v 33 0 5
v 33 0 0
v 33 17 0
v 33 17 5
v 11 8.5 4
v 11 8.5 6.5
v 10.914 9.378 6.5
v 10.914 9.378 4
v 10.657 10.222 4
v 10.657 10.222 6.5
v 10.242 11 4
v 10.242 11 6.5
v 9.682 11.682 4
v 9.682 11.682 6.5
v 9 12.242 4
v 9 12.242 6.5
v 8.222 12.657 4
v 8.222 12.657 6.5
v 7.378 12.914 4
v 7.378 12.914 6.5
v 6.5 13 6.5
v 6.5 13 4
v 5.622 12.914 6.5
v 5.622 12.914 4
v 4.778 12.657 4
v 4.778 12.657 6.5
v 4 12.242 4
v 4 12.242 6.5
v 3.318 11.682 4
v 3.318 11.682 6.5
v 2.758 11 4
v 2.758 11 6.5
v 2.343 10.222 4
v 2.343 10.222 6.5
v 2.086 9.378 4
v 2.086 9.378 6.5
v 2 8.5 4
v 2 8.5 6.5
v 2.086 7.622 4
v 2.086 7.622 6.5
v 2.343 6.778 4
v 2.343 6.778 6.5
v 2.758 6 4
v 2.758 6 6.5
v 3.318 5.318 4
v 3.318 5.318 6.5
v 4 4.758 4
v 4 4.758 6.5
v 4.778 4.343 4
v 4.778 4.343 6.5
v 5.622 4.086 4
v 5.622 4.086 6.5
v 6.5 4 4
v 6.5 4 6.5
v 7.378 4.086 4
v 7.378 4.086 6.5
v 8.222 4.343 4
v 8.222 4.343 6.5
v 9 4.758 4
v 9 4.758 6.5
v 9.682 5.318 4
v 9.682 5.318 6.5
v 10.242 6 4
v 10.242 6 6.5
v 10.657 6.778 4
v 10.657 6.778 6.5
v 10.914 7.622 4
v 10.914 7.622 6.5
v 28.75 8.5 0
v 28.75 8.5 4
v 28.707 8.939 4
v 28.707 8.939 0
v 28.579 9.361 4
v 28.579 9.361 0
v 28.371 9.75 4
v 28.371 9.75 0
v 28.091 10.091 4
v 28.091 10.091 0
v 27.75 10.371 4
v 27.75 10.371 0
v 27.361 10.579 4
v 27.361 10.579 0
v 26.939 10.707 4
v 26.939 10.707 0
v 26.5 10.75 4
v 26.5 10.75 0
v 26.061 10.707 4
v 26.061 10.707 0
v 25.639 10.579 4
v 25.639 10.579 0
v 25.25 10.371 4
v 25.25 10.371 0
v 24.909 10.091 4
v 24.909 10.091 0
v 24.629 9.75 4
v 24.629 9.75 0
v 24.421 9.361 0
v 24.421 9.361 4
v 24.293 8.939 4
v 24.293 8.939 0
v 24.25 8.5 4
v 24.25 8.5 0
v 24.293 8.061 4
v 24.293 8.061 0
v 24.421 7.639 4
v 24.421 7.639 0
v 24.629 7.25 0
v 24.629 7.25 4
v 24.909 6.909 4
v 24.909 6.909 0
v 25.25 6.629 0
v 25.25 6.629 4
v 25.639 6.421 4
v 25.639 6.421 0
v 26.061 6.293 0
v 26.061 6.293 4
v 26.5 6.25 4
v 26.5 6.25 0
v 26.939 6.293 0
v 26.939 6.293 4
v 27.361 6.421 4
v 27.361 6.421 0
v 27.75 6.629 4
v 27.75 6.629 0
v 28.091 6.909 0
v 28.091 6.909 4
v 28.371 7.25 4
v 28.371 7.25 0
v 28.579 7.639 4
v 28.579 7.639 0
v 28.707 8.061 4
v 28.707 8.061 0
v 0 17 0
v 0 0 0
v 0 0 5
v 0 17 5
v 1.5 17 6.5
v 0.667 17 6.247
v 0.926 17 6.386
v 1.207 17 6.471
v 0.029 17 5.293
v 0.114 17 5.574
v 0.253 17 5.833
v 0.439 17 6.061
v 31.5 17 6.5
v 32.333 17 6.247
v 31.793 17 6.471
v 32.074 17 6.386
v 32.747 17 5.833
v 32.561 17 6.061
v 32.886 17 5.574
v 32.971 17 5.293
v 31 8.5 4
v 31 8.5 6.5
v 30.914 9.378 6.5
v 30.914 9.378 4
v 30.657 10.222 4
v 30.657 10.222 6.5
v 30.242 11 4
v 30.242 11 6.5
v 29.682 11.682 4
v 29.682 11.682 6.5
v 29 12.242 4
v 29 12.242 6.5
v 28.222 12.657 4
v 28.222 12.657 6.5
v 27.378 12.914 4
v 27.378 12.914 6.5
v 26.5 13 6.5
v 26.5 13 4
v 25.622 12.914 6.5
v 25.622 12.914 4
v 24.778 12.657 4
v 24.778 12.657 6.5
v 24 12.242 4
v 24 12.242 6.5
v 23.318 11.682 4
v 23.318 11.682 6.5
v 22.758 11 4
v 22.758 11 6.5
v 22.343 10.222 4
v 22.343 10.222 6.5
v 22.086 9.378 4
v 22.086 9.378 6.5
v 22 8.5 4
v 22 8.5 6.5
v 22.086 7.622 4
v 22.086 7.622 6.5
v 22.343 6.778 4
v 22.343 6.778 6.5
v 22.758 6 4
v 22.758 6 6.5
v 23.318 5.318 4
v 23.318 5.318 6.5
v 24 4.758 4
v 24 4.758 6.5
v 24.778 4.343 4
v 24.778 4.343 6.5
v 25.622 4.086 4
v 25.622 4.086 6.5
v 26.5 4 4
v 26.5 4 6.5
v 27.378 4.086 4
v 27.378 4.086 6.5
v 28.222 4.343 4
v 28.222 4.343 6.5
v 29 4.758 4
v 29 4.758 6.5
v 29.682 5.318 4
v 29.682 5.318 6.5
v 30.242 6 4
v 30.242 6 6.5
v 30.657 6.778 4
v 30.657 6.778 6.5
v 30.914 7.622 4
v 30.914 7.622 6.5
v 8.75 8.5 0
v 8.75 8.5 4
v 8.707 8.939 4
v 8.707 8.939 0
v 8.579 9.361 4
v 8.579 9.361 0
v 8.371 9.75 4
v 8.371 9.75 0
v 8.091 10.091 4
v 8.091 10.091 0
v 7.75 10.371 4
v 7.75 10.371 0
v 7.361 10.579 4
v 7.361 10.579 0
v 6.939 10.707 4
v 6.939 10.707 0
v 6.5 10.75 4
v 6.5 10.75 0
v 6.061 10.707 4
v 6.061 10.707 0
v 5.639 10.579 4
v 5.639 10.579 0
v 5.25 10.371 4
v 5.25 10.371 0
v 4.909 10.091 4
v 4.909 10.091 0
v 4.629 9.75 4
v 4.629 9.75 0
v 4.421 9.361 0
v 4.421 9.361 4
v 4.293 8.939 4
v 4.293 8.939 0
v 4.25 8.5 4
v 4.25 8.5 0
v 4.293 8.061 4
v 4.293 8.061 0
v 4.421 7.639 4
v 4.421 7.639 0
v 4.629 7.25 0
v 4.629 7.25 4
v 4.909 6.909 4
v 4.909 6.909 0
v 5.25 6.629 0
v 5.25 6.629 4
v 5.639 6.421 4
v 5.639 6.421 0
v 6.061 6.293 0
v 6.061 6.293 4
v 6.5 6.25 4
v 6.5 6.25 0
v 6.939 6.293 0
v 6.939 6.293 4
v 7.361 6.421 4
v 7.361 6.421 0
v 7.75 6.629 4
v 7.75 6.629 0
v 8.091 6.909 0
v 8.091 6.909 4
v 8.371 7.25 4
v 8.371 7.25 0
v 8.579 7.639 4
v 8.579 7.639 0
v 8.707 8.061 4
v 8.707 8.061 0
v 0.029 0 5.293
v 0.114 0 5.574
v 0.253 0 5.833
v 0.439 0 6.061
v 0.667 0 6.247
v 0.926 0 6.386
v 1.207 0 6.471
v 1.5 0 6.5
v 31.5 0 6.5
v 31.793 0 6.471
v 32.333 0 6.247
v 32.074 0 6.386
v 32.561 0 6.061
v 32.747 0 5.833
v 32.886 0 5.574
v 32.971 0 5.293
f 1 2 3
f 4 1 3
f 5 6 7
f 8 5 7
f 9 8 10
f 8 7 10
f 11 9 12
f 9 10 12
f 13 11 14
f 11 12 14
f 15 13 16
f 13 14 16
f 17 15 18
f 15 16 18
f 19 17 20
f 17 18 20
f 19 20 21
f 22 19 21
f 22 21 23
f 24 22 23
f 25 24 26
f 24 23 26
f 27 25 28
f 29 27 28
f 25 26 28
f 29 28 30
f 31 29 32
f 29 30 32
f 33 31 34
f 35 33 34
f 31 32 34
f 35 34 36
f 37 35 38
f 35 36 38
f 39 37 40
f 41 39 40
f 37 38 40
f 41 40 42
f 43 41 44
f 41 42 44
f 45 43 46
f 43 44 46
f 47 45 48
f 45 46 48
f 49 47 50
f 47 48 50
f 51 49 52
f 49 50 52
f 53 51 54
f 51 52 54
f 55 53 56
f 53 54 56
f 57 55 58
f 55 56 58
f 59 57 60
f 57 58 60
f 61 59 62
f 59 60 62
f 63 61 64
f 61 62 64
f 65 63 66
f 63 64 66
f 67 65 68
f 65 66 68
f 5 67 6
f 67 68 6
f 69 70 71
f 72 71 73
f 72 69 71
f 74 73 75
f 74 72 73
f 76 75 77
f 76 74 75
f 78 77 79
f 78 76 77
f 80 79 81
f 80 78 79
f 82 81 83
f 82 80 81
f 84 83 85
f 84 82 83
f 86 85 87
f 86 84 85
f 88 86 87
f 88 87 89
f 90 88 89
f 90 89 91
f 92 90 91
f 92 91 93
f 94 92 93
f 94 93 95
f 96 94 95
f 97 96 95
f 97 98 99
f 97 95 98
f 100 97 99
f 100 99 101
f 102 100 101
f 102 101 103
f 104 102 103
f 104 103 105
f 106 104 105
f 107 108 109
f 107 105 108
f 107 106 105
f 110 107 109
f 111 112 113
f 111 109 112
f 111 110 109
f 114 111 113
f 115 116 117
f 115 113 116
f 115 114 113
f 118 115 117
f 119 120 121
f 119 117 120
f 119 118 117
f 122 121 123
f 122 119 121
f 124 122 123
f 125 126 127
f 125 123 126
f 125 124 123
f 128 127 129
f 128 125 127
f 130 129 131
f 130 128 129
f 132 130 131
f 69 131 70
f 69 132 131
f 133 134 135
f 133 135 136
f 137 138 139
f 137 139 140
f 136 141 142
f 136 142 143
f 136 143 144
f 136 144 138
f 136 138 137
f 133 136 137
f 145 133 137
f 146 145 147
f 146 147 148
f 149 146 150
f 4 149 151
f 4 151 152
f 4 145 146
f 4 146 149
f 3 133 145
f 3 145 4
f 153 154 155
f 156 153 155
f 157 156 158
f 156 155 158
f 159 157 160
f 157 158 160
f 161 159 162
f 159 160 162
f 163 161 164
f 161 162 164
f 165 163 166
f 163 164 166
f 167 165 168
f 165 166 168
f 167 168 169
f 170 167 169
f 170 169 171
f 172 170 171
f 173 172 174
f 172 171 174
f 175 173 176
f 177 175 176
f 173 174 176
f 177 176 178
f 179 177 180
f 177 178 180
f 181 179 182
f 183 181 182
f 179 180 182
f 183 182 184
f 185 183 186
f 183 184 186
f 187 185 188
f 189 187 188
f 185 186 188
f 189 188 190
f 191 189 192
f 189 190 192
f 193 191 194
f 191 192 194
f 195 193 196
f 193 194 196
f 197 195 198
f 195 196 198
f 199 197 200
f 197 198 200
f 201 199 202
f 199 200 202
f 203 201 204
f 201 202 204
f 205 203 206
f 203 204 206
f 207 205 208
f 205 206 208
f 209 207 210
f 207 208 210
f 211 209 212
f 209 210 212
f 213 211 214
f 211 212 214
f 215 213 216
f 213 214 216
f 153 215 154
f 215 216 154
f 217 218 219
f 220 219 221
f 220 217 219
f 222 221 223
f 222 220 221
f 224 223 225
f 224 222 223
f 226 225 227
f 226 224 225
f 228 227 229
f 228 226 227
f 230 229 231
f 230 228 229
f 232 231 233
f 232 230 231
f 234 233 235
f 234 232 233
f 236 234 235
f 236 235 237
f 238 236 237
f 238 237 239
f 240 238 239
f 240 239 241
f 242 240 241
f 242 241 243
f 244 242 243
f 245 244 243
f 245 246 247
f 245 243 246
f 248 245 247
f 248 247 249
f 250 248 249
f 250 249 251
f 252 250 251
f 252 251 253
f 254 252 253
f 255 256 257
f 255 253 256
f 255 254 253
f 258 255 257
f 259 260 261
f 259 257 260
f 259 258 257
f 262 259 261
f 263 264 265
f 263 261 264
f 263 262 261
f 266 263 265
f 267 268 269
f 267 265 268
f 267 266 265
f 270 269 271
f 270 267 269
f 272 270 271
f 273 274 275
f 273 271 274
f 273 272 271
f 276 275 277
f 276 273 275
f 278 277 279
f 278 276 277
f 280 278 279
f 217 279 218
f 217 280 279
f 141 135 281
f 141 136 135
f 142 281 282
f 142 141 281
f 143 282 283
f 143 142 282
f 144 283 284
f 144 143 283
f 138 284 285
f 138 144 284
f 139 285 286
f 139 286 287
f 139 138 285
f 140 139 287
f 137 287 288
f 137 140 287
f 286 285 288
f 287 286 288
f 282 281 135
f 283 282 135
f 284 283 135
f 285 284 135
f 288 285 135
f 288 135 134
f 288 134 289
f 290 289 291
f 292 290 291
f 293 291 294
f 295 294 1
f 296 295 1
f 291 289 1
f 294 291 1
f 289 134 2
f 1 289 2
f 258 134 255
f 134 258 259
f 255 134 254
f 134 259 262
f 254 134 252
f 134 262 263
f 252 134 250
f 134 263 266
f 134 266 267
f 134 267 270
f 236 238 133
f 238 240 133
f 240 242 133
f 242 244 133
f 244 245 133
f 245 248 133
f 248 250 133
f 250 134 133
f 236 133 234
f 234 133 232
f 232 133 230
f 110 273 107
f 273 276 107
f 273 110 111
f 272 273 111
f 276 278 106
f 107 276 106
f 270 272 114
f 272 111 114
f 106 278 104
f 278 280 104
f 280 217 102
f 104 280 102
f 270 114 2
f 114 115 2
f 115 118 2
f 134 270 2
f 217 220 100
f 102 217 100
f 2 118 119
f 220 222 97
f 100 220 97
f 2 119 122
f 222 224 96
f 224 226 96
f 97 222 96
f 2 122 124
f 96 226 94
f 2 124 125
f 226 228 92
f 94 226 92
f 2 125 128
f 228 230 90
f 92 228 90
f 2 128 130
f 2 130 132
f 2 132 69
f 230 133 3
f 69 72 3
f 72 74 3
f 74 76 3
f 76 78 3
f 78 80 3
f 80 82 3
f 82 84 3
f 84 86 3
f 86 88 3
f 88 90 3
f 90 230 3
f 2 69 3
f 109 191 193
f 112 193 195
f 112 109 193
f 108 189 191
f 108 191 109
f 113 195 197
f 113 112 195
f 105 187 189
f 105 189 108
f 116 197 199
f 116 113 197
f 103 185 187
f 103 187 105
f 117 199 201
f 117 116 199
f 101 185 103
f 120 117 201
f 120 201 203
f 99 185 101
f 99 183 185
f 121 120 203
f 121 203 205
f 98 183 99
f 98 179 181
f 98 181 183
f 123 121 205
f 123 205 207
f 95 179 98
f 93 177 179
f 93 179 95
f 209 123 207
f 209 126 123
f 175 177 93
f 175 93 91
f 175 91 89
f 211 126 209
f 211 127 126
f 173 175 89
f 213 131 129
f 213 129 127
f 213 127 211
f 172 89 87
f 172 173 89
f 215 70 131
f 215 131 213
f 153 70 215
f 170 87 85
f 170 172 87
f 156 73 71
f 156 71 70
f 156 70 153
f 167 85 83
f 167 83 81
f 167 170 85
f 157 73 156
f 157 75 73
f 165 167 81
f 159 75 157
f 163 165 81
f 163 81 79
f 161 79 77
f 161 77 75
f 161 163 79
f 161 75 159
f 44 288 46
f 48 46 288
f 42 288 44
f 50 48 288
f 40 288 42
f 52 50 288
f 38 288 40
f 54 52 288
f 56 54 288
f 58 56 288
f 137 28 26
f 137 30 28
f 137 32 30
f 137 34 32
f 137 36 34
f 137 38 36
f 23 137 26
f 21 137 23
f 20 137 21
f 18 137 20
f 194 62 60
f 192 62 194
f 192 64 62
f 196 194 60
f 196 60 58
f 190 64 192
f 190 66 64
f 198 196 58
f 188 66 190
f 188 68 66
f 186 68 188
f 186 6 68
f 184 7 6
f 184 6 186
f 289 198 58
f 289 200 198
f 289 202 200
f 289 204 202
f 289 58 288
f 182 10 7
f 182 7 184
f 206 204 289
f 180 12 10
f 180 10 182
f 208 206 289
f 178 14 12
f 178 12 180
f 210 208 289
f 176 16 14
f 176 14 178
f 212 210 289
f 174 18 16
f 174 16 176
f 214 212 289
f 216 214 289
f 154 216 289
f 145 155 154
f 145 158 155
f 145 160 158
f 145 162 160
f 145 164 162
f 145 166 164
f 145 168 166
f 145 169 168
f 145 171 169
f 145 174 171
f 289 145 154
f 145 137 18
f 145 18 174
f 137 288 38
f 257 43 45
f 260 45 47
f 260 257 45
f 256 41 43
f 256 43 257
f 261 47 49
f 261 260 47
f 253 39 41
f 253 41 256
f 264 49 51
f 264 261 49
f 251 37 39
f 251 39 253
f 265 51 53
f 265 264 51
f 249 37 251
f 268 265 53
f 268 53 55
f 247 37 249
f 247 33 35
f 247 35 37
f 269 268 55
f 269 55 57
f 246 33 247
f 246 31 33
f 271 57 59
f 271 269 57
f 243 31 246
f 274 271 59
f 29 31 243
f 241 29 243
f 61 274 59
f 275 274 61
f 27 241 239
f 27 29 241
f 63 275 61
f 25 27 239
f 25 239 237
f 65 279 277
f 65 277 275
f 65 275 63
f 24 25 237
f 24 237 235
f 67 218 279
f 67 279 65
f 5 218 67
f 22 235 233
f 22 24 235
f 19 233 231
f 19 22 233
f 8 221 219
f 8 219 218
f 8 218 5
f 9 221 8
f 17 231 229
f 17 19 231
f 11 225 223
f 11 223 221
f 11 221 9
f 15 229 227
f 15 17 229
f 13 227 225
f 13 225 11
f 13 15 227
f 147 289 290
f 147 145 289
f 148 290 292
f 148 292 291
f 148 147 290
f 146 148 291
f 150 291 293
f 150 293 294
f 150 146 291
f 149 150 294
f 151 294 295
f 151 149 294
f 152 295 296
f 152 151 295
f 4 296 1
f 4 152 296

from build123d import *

# Parameters (mm, degrees)
SKETCH_W     = 33
SKETCH_H     = 17
SKETCH_R     = 2.25
PAD_DEPTH    = 6.5
SKETCH001_R  = 4.5
POCKET_DEPTH = 2.5
FILLET_R     = 1.5


with BuildPart() as part:
    # Sketch → Pad (new body)
    with BuildSketch(Plane.XY):
        with Locations((16.5, 8.5)):
            Rectangle(SKETCH_W, SKETCH_H)
        with Locations((6.5, 8.5)):
            Circle(SKETCH_R, mode=Mode.SUBTRACT)
        with Locations((26.5, 8.5)):
            Circle(SKETCH_R, mode=Mode.SUBTRACT)
    extrude(amount=PAD_DEPTH)

    # Sketch001 (on Face8 of Pad) → Pocket (cut)
    with BuildSketch(Plane.XY.offset(6.5)):
        with Locations((6.5, 8.5)):
            Circle(SKETCH001_R)
        with Locations((26.5, 8.5)):
            Circle(SKETCH001_R)
    extrude(amount=-POCKET_DEPTH, mode=Mode.SUBTRACT)

    # Fillet
    fillet_edges = [part.edges().sort_by_distance(p)[0] for p in [
        (33, 8.5, 6.5),
        (0, 8.5, 6.5),
    ]]
    fillet(fillet_edges, radius=FILLET_R)


solid = part.part
